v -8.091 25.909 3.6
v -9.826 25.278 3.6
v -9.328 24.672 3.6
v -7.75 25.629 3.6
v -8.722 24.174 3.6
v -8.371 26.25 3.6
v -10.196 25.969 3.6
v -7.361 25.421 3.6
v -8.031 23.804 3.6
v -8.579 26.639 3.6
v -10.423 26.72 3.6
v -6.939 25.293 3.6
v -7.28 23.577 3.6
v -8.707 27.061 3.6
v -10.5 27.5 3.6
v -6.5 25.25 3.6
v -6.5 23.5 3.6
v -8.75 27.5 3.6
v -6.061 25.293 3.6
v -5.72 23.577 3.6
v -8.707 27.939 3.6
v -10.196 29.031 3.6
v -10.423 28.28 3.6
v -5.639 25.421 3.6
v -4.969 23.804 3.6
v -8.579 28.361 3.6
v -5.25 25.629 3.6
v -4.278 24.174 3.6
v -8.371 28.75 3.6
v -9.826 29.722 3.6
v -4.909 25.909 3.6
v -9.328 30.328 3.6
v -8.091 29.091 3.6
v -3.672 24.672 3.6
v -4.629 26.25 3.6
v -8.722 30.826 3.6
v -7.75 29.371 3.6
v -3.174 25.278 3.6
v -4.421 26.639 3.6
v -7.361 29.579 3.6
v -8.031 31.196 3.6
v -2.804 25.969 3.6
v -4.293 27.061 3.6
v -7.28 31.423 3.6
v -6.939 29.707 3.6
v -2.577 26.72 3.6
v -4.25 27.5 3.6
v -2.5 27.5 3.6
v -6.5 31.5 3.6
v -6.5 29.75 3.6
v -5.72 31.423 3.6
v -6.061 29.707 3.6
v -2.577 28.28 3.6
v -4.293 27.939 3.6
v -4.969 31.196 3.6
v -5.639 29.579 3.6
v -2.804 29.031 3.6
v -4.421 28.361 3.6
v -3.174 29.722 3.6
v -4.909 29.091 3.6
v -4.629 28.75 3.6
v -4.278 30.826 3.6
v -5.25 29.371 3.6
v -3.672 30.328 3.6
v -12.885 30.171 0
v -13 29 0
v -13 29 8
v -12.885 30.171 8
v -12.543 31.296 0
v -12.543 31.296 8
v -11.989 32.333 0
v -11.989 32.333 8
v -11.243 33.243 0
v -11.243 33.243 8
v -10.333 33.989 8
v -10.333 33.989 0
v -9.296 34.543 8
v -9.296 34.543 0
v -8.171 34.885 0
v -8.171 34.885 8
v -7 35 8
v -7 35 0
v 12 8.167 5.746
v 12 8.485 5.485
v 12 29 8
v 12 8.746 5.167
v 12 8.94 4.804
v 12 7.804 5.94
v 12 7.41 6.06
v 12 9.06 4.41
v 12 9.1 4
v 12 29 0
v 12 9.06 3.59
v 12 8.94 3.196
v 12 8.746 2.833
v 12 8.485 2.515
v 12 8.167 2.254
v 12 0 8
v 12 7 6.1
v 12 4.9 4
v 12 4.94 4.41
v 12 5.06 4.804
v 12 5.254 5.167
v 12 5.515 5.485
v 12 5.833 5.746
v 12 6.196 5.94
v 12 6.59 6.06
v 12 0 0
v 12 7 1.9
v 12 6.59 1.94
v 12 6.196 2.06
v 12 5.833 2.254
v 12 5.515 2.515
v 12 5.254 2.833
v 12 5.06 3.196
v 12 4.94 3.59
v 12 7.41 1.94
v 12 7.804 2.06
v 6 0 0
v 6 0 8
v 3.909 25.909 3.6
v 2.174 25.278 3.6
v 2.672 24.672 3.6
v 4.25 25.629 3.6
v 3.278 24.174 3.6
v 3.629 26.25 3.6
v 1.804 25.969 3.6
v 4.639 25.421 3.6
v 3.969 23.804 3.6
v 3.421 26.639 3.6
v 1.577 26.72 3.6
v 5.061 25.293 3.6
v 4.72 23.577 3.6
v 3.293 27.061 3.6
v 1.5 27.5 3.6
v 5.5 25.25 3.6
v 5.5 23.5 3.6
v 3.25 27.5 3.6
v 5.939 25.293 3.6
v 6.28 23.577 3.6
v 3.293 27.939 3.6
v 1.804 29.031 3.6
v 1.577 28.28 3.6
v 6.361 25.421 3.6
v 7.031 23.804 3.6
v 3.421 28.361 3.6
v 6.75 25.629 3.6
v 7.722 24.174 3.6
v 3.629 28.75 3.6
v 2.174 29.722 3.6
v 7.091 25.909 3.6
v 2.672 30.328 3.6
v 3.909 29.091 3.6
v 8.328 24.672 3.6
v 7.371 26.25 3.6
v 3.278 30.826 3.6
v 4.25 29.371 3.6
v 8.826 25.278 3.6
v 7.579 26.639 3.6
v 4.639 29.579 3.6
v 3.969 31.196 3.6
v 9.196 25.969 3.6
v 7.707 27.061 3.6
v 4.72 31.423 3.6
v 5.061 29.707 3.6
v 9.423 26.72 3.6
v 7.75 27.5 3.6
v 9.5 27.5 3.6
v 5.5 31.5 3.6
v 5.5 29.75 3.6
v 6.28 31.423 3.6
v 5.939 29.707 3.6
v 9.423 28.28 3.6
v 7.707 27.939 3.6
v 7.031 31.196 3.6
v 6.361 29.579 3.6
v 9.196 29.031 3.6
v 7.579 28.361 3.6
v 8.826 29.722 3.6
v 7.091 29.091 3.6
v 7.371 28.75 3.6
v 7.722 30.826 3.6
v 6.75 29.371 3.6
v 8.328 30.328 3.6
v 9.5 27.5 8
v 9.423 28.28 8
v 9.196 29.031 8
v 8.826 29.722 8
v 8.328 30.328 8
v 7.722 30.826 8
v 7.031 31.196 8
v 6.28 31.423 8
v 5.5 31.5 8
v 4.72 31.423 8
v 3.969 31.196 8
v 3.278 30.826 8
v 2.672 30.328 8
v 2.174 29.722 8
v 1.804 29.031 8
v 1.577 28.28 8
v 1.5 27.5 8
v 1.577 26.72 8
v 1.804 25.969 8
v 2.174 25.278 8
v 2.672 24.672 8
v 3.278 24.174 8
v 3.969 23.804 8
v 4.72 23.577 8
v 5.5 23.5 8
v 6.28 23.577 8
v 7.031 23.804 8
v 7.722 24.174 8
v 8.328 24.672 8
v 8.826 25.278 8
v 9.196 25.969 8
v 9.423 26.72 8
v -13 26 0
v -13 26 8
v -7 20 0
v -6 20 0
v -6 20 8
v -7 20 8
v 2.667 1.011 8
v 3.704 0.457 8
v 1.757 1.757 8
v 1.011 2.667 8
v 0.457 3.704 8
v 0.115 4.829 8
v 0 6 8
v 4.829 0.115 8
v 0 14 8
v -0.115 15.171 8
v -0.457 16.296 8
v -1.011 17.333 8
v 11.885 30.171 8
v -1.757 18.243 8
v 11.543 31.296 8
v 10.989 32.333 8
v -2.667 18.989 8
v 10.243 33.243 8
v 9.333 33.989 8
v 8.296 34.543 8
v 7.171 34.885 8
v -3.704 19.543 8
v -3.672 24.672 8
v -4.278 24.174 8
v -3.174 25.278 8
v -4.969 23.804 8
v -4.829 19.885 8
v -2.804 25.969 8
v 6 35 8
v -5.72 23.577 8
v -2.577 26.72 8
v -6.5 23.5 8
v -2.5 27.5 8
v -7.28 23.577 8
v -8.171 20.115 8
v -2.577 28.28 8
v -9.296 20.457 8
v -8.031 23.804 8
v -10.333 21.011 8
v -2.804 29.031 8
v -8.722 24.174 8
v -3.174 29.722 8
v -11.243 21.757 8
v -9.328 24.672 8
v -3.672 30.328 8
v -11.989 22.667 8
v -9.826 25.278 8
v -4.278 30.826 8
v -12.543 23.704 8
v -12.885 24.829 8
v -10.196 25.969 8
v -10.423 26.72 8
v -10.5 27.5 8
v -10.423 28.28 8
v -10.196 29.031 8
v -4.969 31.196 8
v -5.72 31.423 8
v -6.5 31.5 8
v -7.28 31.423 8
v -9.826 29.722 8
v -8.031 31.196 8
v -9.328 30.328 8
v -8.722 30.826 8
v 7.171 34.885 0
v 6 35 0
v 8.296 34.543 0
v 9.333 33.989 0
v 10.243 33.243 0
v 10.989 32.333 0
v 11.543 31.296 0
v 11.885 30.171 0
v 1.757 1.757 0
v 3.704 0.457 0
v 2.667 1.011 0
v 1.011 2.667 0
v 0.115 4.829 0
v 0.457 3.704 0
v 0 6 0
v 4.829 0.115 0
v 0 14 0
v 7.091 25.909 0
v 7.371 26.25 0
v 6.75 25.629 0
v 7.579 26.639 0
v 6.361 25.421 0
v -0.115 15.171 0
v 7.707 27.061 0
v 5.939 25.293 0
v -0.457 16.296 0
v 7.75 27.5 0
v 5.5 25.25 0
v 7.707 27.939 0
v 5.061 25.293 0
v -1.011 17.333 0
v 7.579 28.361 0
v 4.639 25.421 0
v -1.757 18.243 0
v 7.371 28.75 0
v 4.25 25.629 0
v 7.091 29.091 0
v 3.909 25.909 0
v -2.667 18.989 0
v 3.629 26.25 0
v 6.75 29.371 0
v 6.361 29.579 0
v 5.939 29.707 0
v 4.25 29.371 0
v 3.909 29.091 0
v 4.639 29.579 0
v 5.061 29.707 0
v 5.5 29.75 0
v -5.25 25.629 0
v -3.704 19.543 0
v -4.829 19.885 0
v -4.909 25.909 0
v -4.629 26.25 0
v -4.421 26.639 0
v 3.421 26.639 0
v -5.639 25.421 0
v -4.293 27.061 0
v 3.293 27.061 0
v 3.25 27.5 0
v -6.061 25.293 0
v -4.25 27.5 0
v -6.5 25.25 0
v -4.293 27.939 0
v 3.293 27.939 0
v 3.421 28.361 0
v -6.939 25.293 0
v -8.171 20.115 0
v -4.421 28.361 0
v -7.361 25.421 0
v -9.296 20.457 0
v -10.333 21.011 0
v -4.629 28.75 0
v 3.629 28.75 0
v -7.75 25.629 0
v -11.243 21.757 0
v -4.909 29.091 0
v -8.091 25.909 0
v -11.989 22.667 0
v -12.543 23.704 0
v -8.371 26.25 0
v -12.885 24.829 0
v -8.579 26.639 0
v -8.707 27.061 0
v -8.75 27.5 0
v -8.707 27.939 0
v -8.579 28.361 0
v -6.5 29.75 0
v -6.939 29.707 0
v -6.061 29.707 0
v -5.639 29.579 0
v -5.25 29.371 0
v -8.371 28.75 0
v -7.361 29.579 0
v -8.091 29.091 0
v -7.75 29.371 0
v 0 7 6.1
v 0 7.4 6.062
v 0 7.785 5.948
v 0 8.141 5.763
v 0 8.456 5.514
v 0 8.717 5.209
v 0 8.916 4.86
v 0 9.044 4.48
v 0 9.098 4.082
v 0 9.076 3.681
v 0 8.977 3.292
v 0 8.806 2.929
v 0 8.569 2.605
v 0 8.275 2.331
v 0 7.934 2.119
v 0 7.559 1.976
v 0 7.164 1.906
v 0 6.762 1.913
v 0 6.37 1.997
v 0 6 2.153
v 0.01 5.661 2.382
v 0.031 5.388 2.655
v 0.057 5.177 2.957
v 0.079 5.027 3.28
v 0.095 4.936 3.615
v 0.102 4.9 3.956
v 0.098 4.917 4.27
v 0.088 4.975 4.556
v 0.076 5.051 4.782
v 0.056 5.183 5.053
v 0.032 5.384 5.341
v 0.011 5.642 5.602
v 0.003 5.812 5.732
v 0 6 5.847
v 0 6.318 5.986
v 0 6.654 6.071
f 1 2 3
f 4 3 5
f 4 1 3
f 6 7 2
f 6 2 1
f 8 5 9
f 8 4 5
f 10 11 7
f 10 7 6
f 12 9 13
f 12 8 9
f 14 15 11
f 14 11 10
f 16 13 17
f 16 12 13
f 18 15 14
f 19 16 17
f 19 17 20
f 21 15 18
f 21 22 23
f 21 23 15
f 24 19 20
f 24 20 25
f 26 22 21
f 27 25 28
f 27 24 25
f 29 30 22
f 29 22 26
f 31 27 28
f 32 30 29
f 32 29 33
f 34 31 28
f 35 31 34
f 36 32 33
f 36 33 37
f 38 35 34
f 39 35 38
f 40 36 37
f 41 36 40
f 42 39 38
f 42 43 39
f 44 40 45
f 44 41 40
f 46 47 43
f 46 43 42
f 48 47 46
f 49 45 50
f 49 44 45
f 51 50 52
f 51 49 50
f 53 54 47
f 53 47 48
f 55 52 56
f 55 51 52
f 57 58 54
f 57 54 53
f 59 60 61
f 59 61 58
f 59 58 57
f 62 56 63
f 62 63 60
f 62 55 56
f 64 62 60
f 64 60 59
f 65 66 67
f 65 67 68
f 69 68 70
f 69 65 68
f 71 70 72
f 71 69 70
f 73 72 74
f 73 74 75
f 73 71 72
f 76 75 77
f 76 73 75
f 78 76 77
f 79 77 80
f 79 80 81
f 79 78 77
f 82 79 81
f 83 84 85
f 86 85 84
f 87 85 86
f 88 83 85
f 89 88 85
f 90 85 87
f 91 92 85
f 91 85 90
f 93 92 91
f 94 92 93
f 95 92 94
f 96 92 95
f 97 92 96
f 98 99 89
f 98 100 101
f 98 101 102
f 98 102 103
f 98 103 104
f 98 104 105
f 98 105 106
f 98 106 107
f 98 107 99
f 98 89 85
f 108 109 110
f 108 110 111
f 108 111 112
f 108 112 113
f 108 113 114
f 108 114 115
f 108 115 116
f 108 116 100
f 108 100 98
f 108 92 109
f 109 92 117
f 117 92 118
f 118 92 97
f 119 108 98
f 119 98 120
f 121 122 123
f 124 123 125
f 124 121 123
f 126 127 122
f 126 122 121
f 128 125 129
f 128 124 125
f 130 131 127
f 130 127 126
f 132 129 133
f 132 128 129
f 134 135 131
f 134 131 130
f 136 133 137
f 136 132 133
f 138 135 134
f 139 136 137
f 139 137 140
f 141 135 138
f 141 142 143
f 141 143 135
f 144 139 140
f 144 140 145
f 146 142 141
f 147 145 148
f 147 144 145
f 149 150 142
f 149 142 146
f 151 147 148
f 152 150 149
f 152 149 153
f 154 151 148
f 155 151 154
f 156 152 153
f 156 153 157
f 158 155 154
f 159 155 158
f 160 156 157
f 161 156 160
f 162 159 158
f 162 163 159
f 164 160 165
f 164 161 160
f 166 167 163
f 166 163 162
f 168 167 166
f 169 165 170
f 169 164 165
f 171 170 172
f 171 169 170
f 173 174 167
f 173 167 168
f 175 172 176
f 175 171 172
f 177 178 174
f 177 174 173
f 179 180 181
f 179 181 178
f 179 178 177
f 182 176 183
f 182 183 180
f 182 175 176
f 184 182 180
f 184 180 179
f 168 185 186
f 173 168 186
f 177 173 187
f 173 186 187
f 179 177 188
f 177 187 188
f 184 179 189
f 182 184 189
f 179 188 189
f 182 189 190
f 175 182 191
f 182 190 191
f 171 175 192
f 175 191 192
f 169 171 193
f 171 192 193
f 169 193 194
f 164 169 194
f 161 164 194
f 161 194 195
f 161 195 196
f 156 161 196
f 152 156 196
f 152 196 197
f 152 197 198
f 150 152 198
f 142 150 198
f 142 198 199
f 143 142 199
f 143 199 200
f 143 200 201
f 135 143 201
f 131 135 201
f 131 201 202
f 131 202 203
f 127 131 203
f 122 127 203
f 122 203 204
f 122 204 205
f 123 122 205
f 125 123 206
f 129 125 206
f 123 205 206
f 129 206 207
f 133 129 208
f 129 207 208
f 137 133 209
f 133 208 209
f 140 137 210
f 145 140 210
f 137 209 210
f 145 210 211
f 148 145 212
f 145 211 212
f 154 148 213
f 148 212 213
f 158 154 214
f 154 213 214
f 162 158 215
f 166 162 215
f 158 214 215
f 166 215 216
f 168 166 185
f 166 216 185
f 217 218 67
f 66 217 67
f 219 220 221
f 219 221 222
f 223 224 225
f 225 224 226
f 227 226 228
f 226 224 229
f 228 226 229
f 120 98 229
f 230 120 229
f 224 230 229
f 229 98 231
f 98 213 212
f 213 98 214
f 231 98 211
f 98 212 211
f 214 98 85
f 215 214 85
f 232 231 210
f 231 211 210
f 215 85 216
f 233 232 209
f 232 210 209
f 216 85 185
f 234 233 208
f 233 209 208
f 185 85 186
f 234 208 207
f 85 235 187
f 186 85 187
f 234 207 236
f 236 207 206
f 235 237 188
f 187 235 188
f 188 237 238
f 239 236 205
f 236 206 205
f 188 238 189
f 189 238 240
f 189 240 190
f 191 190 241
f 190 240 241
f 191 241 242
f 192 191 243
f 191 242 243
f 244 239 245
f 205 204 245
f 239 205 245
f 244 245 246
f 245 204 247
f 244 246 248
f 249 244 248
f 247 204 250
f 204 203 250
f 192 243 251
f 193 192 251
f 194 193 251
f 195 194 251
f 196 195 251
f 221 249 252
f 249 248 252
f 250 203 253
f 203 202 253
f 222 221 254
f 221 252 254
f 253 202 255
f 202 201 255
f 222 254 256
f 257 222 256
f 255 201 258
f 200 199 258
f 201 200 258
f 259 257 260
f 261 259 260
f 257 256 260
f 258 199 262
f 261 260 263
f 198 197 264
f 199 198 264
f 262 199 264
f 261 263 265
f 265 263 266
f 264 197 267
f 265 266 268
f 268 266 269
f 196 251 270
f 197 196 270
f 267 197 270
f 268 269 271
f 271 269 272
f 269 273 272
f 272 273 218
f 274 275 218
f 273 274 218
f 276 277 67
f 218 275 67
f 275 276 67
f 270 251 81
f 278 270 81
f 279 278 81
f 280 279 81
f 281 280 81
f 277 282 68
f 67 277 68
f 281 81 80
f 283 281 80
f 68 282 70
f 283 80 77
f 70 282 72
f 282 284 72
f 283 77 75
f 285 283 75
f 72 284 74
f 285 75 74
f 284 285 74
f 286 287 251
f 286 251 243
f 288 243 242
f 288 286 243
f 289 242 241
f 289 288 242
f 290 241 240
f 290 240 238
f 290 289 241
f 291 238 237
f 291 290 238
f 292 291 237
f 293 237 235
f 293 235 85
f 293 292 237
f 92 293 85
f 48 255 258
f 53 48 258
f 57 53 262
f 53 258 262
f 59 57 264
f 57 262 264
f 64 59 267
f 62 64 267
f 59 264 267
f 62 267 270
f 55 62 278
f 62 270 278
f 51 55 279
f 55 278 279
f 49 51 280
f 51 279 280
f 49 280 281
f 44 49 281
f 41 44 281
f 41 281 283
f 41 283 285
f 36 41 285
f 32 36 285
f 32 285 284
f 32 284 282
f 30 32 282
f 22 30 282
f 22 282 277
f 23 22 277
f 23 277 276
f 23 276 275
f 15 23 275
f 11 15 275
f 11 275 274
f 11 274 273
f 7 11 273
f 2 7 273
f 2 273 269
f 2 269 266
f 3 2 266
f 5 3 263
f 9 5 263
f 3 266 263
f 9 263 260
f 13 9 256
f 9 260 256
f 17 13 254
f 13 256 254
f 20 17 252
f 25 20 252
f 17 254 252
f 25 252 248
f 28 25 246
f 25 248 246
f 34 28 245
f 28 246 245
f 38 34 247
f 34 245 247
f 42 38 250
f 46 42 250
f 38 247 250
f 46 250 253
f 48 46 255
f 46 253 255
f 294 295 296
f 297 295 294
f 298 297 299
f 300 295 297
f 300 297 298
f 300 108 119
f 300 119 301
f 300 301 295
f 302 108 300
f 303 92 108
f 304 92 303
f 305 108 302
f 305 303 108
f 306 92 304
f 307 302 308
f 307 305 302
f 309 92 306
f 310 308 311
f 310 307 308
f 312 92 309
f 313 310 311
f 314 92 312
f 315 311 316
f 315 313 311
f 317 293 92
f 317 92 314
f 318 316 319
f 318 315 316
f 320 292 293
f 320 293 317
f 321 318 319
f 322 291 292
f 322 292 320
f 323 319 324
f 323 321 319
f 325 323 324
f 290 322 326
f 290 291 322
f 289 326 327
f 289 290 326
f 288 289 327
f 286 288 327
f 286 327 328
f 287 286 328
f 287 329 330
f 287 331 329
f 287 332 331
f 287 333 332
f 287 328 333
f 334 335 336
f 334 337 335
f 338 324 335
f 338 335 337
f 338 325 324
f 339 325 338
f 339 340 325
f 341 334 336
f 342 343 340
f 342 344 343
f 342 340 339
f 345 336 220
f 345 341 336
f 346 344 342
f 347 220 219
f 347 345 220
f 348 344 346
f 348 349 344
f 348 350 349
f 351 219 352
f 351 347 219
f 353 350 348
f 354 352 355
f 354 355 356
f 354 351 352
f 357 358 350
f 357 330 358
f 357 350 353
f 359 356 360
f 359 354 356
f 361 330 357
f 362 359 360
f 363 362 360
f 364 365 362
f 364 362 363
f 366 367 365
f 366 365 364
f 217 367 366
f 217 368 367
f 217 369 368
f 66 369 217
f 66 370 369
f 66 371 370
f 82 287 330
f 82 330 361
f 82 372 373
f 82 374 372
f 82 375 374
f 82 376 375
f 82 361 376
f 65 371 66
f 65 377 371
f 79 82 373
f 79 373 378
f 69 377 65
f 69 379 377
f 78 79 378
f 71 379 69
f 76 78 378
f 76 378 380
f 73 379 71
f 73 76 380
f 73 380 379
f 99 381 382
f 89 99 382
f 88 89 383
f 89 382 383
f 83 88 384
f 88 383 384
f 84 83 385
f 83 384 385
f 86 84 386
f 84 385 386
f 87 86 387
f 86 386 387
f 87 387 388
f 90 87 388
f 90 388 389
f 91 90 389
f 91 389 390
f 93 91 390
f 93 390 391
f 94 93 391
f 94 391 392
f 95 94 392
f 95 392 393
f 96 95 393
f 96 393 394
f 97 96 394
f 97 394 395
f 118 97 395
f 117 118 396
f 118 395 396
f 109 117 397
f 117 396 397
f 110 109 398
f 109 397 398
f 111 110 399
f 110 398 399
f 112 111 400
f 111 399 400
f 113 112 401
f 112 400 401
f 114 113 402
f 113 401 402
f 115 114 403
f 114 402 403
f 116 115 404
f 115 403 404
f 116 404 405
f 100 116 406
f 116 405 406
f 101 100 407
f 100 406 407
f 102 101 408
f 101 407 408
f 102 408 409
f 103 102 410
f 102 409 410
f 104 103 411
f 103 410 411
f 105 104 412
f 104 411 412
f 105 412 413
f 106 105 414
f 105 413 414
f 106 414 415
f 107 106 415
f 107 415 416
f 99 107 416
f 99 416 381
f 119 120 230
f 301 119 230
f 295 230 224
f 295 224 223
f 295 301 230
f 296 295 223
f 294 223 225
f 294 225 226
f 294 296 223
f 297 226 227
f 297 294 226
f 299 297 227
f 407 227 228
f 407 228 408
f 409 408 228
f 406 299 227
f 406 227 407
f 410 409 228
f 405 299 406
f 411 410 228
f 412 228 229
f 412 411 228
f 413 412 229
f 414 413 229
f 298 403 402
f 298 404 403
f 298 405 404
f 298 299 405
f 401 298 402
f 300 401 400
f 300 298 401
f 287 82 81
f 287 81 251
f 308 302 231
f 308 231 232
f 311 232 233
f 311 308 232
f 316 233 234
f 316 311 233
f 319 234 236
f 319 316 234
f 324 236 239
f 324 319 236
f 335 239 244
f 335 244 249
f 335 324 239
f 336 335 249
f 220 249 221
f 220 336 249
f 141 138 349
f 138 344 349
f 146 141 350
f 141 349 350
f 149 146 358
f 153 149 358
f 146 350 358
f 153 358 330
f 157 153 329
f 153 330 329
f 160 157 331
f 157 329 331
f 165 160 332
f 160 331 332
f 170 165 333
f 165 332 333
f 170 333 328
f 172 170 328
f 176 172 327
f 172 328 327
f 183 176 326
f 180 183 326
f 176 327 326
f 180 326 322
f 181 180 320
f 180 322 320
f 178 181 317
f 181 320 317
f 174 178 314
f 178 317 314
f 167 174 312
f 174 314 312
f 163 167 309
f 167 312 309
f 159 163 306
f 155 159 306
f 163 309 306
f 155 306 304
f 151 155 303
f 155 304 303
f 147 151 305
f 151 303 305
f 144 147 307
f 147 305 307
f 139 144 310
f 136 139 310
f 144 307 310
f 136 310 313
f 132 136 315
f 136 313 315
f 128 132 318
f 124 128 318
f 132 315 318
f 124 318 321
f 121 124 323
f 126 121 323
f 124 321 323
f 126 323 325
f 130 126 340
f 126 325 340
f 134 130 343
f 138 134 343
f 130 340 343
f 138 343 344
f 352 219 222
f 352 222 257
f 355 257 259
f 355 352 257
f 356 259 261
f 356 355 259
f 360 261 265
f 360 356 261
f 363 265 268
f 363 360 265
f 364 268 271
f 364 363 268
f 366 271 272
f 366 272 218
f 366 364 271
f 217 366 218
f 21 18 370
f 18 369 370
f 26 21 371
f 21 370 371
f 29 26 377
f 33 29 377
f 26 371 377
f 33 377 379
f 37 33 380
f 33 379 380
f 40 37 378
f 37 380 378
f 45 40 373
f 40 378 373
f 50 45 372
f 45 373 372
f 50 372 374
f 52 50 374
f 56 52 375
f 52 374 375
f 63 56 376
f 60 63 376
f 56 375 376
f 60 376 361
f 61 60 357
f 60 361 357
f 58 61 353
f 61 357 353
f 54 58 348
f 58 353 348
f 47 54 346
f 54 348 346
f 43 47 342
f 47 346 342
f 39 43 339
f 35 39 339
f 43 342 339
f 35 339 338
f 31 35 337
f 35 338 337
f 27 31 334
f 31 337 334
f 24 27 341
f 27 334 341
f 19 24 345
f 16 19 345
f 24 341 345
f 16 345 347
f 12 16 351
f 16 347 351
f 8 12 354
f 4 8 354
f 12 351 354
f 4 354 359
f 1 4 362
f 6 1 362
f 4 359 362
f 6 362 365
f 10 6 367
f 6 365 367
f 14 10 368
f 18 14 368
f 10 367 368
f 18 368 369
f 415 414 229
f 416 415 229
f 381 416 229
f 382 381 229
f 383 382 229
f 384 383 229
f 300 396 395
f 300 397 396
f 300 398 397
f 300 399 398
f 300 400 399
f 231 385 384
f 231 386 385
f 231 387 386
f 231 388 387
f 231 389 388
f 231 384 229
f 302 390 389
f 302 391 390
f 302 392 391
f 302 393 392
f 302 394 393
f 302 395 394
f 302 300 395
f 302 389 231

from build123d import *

# Parameters (mm, degrees)
EXTRUDE1_DEPTH                                      = 8
CBORE_FOR_M4_HEX_SOCKET_HEAD_CAP_SCREW1_D           = 4.5
CBORE_FOR_M4_HEX_SOCKET_HEAD_CAP_SCREW1_CBORE_D     = 8
CBORE_FOR_M4_HEX_SOCKET_HEAD_CAP_SCREW1_CBORE_DEPTH = 4.4
M5_TAPPED_HOLE1_D                                   = 4.2


with BuildPart() as part:
    # Sketch1 → Extrude1 (new body)
    with BuildSketch(Plane.XY):
        with BuildLine():
            Line((0, 6), (0, 14))
            ThreePointArc((0, 14), (-1.757359313, 18.242640687), (-6, 20))
            Line((-6, 20), (-7, 20))
            ThreePointArc((-7, 20), (-11.242640687, 21.757359313), (-13, 26))
            Line((-13, 26), (-13, 29))
            ThreePointArc((-13, 29), (-11.242640687, 33.242640687), (-7, 35))
            Line((-7, 35), (6, 35))
            ThreePointArc((6, 35), (10.242640687, 33.242640687), (12, 29))
            Line((12, 29), (12, 0))
            Line((12, 0), (6, 0))
            ThreePointArc((6, 0), (1.757359313, 1.757359313), (0, 6))
        make_face()
    extrude(amount=EXTRUDE1_DEPTH)

    # CBORE for M4 Hex Socket Head Cap Screw1 (through all)
    with Locations(Plane.XY.offset(8)):
        with Locations((-6.5, 27.5), (5.5, 27.5)):
            CounterBoreHole(CBORE_FOR_M4_HEX_SOCKET_HEAD_CAP_SCREW1_D / 2, CBORE_FOR_M4_HEX_SOCKET_HEAD_CAP_SCREW1_CBORE_D / 2, CBORE_FOR_M4_HEX_SOCKET_HEAD_CAP_SCREW1_CBORE_DEPTH)

    # M5 Tapped Hole1 (through all)
    with Locations(Plane(origin=(12, 0, 0), x_dir=(0, 0, -1), z_dir=(1, 0, 0))):
        with Locations((-4, 7)):
            Hole(M5_TAPPED_HOLE1_D / 2)


solid = part.part
